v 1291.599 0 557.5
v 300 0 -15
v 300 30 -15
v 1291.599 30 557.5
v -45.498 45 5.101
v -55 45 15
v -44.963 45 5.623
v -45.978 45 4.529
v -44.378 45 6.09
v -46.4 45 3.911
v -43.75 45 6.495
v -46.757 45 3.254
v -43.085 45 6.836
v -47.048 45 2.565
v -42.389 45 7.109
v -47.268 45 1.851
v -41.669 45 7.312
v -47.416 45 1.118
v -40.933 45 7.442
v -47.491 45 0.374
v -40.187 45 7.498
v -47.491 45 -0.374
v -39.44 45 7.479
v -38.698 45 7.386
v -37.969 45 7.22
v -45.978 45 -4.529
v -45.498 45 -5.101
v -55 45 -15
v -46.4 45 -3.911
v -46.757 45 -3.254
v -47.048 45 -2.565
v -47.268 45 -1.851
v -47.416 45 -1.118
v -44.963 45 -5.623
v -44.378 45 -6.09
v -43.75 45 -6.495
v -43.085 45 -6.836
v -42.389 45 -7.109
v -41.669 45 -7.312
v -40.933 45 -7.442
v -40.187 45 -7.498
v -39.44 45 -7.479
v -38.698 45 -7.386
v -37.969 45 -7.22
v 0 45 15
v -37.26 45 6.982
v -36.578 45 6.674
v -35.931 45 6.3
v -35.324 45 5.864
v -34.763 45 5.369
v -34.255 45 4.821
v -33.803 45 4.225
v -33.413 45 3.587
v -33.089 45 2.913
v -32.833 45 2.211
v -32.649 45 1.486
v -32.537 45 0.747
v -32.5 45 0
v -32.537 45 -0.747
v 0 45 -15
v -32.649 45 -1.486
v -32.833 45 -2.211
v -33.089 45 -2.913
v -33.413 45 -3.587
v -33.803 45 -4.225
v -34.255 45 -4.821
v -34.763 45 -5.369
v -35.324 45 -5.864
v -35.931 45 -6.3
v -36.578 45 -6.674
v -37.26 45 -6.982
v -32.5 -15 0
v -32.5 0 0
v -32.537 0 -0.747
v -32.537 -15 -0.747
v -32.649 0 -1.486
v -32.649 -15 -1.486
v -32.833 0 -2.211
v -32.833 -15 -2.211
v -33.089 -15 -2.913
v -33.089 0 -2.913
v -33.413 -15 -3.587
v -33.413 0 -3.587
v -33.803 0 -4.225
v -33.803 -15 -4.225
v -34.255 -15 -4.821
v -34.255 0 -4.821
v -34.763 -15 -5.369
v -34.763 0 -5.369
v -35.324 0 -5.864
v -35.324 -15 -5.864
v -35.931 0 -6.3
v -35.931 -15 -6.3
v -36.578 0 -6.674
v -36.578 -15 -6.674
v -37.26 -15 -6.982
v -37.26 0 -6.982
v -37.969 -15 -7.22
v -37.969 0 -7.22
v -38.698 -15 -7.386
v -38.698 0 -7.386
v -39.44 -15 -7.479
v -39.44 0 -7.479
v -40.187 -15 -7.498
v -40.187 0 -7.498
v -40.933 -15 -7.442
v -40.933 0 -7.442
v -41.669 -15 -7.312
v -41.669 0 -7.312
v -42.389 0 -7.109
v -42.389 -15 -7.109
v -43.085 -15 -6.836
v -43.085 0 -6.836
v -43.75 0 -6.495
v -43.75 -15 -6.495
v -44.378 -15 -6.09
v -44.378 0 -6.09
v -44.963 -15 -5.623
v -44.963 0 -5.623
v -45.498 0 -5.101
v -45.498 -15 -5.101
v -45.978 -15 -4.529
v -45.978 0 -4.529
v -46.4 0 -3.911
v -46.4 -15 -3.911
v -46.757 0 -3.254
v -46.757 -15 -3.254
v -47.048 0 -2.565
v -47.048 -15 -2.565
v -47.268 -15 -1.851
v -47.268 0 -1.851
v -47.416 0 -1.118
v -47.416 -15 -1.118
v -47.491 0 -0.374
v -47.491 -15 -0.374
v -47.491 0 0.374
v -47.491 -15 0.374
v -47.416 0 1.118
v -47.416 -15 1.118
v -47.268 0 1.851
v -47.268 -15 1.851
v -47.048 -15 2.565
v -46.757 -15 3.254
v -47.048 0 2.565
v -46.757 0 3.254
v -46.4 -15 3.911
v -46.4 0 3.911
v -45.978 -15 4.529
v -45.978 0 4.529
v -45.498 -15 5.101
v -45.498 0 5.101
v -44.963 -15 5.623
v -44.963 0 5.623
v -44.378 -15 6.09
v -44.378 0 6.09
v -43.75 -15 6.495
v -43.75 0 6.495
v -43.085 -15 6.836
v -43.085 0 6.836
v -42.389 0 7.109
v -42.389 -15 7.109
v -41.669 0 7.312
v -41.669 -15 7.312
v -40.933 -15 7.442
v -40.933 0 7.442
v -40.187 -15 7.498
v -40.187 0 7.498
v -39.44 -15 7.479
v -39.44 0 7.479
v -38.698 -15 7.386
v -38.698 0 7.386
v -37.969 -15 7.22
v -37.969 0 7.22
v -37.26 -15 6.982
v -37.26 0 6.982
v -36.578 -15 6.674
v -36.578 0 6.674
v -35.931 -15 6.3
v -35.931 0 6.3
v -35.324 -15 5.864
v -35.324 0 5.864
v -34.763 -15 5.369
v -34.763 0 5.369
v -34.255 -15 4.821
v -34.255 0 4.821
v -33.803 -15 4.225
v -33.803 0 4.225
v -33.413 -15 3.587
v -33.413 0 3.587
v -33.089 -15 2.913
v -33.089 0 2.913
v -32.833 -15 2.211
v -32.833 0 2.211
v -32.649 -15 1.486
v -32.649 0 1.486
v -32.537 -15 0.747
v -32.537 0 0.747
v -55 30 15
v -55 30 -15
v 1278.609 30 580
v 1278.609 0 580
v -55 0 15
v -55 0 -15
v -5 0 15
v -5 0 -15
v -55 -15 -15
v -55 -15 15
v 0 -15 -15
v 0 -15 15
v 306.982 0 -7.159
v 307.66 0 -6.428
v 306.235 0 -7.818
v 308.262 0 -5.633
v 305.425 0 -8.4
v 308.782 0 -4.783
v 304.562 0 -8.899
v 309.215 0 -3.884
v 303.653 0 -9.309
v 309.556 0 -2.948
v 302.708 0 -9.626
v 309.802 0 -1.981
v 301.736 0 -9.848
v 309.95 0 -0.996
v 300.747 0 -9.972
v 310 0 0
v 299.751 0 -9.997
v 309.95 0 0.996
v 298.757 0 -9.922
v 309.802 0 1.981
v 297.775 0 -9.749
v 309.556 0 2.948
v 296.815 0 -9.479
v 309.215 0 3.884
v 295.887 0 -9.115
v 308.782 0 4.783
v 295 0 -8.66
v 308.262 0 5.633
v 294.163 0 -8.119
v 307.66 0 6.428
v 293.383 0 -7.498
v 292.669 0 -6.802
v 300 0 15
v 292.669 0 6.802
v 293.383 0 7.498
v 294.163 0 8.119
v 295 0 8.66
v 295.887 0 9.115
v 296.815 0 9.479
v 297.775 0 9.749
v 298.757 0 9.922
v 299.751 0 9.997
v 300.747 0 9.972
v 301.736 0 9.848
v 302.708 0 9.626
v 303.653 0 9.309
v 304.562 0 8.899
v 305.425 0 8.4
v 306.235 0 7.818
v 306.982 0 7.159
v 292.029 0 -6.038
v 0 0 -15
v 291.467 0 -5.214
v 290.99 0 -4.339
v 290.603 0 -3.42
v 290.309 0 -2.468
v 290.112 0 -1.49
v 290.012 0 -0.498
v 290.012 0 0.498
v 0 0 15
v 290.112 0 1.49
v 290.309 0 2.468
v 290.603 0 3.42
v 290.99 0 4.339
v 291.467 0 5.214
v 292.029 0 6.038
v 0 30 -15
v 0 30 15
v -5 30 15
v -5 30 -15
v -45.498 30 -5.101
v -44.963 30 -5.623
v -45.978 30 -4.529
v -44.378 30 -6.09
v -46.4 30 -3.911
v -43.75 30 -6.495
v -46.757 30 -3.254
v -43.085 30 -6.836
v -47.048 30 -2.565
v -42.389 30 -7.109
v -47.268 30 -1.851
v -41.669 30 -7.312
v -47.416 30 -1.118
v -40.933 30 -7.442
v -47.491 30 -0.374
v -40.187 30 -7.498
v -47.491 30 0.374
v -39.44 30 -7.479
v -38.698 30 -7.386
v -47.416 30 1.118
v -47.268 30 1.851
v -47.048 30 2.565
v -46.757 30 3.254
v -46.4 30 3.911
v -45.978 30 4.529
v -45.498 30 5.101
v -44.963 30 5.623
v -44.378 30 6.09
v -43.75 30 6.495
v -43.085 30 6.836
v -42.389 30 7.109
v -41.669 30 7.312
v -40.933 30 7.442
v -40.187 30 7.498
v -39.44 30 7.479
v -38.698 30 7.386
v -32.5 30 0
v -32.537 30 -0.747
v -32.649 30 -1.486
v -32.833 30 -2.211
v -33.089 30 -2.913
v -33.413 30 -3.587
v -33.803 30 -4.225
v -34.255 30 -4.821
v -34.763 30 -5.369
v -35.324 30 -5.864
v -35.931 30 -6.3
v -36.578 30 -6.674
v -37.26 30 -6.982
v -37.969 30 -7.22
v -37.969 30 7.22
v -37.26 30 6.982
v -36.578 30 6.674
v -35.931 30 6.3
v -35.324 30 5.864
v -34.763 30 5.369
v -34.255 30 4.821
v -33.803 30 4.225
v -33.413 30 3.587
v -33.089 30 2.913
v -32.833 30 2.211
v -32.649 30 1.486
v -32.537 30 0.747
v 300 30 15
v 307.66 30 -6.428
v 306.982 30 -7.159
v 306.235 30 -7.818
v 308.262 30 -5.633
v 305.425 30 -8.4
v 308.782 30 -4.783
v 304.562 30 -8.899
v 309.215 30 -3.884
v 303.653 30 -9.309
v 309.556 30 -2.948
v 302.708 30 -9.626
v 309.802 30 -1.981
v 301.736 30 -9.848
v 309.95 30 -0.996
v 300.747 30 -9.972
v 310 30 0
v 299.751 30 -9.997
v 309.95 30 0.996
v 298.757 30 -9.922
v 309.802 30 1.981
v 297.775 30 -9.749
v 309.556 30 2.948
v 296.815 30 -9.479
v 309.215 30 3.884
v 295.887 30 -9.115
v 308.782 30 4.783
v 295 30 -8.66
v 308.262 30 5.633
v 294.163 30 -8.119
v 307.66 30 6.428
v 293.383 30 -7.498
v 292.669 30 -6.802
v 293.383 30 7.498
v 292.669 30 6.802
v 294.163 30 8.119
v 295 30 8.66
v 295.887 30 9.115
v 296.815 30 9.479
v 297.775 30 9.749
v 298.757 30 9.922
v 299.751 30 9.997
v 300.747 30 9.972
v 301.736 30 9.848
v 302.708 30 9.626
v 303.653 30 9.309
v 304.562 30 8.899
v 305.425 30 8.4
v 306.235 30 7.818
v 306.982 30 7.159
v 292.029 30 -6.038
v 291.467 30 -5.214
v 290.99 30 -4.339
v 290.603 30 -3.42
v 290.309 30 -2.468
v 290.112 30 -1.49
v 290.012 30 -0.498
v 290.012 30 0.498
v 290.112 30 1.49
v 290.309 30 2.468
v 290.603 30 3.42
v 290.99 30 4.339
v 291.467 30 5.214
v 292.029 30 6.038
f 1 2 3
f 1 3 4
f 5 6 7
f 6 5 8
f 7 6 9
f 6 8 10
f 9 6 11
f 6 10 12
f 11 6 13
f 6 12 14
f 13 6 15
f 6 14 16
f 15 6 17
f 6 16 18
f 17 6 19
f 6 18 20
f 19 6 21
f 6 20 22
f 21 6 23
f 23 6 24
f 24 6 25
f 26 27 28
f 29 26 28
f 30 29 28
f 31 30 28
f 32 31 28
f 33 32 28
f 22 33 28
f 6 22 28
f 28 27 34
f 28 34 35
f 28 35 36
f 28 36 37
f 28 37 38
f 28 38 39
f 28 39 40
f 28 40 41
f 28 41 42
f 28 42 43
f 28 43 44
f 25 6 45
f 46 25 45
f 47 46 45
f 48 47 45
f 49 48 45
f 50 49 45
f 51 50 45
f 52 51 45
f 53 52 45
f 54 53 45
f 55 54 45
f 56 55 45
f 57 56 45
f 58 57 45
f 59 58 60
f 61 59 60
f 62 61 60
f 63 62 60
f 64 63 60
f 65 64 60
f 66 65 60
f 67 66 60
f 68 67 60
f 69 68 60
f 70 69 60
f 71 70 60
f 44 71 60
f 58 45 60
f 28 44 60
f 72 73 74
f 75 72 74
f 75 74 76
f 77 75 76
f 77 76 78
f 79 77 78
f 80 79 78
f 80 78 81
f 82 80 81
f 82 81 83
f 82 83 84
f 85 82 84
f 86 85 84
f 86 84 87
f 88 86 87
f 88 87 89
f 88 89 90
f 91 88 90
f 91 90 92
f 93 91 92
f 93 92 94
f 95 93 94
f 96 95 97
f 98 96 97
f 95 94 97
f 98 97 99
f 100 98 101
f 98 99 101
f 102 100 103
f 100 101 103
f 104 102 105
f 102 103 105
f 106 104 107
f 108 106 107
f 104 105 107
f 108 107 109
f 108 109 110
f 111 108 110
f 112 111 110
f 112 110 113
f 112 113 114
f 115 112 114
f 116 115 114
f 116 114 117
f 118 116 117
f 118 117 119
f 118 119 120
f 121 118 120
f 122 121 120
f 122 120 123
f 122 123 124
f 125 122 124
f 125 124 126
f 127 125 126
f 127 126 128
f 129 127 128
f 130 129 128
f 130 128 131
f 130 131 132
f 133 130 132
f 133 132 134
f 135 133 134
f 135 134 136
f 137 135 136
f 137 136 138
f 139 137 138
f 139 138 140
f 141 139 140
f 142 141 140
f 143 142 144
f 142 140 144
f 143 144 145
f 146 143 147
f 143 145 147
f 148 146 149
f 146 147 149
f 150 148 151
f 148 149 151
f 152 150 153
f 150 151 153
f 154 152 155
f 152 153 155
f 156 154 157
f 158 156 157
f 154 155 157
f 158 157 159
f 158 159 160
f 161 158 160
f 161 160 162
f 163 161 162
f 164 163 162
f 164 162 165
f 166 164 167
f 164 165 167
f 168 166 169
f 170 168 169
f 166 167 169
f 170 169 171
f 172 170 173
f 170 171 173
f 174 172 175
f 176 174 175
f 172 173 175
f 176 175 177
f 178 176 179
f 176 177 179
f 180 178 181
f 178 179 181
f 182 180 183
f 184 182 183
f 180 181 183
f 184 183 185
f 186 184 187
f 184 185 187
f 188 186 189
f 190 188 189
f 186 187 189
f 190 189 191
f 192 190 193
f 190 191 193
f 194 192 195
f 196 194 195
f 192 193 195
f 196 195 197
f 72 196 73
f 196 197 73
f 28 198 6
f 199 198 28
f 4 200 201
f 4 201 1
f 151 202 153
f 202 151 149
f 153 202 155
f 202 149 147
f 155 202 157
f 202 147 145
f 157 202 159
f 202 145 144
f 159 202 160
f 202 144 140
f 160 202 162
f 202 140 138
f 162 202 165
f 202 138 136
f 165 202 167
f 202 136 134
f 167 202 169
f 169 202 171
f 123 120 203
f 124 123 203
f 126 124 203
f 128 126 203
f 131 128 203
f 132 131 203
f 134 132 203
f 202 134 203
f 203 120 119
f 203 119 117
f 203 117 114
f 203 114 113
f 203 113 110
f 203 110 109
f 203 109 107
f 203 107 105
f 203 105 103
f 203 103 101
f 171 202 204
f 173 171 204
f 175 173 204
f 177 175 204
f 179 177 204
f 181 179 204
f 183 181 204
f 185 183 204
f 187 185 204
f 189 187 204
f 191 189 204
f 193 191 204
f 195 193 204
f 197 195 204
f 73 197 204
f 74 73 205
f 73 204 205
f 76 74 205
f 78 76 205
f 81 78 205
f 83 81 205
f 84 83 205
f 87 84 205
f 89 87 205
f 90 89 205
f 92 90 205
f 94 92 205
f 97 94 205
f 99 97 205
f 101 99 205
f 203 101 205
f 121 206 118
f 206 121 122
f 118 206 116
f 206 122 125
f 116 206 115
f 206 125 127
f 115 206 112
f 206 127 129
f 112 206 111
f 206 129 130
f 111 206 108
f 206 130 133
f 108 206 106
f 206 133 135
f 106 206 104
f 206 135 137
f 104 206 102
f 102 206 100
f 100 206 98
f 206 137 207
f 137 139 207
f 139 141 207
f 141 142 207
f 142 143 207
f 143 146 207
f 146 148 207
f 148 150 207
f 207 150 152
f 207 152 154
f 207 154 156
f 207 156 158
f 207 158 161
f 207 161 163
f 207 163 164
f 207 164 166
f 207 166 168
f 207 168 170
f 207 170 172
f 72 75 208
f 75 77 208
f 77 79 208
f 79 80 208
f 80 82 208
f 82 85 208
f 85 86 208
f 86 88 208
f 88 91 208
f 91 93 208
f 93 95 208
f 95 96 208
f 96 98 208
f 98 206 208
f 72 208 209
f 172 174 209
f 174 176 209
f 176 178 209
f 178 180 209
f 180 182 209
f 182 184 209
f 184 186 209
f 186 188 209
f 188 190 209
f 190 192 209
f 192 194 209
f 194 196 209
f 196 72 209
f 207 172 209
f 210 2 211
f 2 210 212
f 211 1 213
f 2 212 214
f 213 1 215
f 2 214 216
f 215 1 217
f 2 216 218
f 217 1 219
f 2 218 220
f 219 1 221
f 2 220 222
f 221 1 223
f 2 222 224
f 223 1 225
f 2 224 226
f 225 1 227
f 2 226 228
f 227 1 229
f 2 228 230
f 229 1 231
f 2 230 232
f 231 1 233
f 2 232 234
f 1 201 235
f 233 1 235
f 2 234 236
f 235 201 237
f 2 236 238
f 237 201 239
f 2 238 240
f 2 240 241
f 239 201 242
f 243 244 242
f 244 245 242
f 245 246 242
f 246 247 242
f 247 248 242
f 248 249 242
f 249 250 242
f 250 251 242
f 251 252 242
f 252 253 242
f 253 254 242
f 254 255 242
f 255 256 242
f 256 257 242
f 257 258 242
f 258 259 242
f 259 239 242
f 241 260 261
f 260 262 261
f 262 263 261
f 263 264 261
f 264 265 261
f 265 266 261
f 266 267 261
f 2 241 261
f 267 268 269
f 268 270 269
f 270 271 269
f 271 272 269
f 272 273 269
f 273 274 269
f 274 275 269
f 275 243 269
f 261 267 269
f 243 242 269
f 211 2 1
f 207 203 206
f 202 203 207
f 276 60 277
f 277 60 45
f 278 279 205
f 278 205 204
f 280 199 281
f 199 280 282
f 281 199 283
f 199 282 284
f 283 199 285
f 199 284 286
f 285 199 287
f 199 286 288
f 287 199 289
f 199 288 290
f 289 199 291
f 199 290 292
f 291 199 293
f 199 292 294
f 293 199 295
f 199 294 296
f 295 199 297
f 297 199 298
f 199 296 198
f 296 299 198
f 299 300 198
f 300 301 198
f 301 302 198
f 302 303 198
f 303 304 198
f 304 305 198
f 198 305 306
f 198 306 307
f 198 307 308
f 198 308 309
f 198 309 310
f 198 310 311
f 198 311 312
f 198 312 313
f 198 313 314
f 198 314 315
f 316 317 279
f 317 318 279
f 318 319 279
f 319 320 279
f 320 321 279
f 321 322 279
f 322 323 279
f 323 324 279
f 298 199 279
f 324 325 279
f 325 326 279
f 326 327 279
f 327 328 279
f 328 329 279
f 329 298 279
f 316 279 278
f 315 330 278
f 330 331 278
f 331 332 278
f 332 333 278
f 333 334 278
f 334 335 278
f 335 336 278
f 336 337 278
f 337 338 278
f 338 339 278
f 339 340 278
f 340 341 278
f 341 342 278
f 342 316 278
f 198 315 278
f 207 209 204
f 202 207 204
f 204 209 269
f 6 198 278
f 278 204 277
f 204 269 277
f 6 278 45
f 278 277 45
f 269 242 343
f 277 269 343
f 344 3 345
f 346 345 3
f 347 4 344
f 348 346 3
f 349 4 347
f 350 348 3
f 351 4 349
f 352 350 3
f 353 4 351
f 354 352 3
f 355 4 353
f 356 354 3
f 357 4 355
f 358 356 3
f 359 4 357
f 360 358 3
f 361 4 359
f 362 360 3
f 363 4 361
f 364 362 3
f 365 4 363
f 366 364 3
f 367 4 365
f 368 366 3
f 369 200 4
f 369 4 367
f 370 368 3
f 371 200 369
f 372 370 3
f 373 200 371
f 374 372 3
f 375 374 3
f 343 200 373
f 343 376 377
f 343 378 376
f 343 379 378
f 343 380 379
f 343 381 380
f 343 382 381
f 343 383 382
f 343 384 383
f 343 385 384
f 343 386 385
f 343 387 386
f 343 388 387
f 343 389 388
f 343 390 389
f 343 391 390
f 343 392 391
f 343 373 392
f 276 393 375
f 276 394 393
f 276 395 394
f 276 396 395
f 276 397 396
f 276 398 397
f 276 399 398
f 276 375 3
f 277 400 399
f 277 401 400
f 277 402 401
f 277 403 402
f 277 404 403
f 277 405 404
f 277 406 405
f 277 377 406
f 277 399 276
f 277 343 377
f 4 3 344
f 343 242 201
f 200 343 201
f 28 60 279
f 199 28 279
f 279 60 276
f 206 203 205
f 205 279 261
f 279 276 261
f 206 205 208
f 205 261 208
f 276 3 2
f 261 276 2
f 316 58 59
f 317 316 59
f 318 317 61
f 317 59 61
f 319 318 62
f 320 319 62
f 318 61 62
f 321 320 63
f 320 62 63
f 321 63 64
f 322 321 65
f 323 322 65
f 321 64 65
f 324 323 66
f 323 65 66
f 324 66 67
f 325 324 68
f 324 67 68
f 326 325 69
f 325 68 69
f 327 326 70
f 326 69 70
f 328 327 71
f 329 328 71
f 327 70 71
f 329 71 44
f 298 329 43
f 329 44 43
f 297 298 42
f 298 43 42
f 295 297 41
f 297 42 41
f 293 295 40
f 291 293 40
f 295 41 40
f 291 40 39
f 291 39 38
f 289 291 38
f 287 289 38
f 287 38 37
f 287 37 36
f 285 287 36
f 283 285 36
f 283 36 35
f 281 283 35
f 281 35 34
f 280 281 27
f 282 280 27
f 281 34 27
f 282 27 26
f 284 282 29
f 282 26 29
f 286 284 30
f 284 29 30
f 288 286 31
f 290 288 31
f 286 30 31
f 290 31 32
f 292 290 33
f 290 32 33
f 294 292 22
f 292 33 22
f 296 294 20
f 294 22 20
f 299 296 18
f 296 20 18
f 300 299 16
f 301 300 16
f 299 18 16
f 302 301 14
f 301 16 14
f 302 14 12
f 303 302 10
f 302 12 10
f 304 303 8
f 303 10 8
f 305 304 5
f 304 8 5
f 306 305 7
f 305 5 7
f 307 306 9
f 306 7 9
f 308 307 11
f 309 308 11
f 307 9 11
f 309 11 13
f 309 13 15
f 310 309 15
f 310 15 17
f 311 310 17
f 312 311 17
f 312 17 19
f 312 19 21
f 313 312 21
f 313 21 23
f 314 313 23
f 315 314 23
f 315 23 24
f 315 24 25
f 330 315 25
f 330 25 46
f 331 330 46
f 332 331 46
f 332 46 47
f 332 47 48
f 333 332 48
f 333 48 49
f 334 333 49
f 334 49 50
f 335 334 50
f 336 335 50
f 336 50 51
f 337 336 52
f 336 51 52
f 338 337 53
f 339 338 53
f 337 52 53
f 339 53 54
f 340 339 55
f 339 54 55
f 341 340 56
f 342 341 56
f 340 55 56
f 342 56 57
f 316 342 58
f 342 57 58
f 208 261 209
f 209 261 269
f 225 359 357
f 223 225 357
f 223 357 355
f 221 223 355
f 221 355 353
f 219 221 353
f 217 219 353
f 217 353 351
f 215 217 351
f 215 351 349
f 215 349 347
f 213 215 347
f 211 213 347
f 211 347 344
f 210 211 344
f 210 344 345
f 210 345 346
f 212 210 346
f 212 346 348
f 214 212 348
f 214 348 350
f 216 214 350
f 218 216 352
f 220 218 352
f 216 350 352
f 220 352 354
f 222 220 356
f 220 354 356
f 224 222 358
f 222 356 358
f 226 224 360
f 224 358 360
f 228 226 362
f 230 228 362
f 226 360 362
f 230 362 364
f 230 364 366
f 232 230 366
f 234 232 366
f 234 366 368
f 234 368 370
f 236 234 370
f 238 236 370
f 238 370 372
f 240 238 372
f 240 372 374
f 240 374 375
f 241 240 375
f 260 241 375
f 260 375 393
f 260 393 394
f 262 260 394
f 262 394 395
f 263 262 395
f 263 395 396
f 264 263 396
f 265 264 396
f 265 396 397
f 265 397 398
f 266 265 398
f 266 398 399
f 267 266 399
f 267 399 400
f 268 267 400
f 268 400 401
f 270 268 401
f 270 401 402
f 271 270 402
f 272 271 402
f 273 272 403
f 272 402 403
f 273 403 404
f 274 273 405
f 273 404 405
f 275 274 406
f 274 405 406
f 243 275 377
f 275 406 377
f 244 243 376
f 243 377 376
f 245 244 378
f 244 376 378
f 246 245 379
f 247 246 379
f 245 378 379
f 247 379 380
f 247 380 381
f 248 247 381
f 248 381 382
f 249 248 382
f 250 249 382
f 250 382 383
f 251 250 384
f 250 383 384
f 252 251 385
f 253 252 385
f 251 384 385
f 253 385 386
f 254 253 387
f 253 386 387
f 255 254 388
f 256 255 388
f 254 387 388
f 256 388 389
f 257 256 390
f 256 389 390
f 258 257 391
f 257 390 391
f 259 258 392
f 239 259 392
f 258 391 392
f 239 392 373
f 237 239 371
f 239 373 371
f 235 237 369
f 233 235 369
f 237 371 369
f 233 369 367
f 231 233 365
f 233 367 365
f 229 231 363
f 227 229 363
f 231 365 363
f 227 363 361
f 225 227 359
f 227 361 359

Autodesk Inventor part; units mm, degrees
ref_plane "YZ Plane" through (0, 0, 0) normal (1, 0, 0) x (0, 1, 0)
ref_plane "XY Plane" through (0, 0, 0) normal (0, 0, 1) x (1, 0, 0)
sketch "Szkic1" plane through (0, 0, 0) normal (0, 1, 0) x (-1, 0, 0)
  line L0 (0, 15) -> (-300, 15)
  line L1 (-300, 15) -> (-300, -15)
  line L2 (-300, -15) -> (0, -15)
  line L3 (0, -15) -> (0, 15)
  line L4 (-300, 15) -> (-1278.6087, 580)
  line L5 (-1278.6087, 580) -> (-1291.5991, 557.5)
  line L6 (-300, -15) -> (-1291.5991, 557.5)
  point P0 (0, 0)
  point P1 (0, 0)
  dimension "d0" = 300
  dimension "d1" = 30
  dimension "d2" = 150
  dimension "d3" = 1130
extrude "Wyciągnięcie proste1" add sketch "Szkic1" along normal blind 30
sketch "Szkic2" plane through (0, 30, 0) normal (0, 1, 0) x (1, 0, 0)
  circle A0 centre (300, 0) radius 10
  line L0 (300, 15) -> (0, 15) projected
  point P0 (0, 0)
  dimension "d6" = 20
  dimension "d7" = 15
extrude "Wyciągnięcie proste2" cut sketch "Szkic2" against normal through all
sketch "Szkic3" plane through (0, 0, -15) normal (-1, 0, 0) x (0, 0, 1)
  point P0 (15, 0)
sketch "Szkic4" plane through (0, 0, -15) normal (-1, 0, 0) x (0, 0, 1)
  line L0 (0, 0) -> (30, 0) projected
  line L1 (30, 0) -> (30, 30) projected
  line L2 (0, 30) -> (30, 30) projected
  line L3 (0, 0) -> (0, 30) projected
  line L4 (30, 45) -> (0, 45)
  line L5 (0, 45) -> (0, -15)
  line L6 (0, -15) -> (30, -15)
  line L7 (30, -15) -> (30, 45)
  line L8 (30, 45) -> (0, -15) construction
  line L9 (0, 45) -> (30, -15) construction
  point P0 (15, 0)
  point P1 (15, 15)
  dimension "d10" = 30
  dimension "d11" = 60
  dimension "d12" = 0
  dimension "d13" = 15
extrude "Wyciągnięcie proste3" add sketch "Szkic4" along normal blind 5
sketch "Szkic5" plane through (-5, 0, -15) normal (-1, 0, 0) x (0, 0, 1)
  line L0 (0, -15) -> (30, -15)
  line L1 (30, -15) -> (30, 0)
  line L2 (30, 0) -> (0, 0)
  line L3 (0, 0) -> (0, -15)
  point P0 (15, 0)
  dimension "d16" = 30
  dimension "d17" = 15
extrude "Wyciągnięcie proste4" add sketch "Szkic5" along normal blind 50
ref_plane "Płaszczyzna konstrukcyjna1" through (0, 15, 0) normal (0, 1, 0) x (-1, 0, 0)
mirror "Odbicie lustrzane1" about plane through (0, 15, 0) normal (0, 1, 0) of "Wyciągnięcie proste4"
sketch "Szkic6" plane through (0, 45, 15) normal (0, 1, 0) x (1, 0, 0)
  circle A0 centre (-40, 15) radius 7.5
  line L0 (-55, 30) -> (-55, 0) projected
  line L1 (0, 0) -> (0, 30) projected
  point P0 (0, 15)
  point P1 (0, 15)
  dimension "d21" = 15
  dimension "d22" = 15
extrude "Wyciągnięcie proste5" cut sketch "Szkic6" against normal through all
properties part number "3" material "Złote"
